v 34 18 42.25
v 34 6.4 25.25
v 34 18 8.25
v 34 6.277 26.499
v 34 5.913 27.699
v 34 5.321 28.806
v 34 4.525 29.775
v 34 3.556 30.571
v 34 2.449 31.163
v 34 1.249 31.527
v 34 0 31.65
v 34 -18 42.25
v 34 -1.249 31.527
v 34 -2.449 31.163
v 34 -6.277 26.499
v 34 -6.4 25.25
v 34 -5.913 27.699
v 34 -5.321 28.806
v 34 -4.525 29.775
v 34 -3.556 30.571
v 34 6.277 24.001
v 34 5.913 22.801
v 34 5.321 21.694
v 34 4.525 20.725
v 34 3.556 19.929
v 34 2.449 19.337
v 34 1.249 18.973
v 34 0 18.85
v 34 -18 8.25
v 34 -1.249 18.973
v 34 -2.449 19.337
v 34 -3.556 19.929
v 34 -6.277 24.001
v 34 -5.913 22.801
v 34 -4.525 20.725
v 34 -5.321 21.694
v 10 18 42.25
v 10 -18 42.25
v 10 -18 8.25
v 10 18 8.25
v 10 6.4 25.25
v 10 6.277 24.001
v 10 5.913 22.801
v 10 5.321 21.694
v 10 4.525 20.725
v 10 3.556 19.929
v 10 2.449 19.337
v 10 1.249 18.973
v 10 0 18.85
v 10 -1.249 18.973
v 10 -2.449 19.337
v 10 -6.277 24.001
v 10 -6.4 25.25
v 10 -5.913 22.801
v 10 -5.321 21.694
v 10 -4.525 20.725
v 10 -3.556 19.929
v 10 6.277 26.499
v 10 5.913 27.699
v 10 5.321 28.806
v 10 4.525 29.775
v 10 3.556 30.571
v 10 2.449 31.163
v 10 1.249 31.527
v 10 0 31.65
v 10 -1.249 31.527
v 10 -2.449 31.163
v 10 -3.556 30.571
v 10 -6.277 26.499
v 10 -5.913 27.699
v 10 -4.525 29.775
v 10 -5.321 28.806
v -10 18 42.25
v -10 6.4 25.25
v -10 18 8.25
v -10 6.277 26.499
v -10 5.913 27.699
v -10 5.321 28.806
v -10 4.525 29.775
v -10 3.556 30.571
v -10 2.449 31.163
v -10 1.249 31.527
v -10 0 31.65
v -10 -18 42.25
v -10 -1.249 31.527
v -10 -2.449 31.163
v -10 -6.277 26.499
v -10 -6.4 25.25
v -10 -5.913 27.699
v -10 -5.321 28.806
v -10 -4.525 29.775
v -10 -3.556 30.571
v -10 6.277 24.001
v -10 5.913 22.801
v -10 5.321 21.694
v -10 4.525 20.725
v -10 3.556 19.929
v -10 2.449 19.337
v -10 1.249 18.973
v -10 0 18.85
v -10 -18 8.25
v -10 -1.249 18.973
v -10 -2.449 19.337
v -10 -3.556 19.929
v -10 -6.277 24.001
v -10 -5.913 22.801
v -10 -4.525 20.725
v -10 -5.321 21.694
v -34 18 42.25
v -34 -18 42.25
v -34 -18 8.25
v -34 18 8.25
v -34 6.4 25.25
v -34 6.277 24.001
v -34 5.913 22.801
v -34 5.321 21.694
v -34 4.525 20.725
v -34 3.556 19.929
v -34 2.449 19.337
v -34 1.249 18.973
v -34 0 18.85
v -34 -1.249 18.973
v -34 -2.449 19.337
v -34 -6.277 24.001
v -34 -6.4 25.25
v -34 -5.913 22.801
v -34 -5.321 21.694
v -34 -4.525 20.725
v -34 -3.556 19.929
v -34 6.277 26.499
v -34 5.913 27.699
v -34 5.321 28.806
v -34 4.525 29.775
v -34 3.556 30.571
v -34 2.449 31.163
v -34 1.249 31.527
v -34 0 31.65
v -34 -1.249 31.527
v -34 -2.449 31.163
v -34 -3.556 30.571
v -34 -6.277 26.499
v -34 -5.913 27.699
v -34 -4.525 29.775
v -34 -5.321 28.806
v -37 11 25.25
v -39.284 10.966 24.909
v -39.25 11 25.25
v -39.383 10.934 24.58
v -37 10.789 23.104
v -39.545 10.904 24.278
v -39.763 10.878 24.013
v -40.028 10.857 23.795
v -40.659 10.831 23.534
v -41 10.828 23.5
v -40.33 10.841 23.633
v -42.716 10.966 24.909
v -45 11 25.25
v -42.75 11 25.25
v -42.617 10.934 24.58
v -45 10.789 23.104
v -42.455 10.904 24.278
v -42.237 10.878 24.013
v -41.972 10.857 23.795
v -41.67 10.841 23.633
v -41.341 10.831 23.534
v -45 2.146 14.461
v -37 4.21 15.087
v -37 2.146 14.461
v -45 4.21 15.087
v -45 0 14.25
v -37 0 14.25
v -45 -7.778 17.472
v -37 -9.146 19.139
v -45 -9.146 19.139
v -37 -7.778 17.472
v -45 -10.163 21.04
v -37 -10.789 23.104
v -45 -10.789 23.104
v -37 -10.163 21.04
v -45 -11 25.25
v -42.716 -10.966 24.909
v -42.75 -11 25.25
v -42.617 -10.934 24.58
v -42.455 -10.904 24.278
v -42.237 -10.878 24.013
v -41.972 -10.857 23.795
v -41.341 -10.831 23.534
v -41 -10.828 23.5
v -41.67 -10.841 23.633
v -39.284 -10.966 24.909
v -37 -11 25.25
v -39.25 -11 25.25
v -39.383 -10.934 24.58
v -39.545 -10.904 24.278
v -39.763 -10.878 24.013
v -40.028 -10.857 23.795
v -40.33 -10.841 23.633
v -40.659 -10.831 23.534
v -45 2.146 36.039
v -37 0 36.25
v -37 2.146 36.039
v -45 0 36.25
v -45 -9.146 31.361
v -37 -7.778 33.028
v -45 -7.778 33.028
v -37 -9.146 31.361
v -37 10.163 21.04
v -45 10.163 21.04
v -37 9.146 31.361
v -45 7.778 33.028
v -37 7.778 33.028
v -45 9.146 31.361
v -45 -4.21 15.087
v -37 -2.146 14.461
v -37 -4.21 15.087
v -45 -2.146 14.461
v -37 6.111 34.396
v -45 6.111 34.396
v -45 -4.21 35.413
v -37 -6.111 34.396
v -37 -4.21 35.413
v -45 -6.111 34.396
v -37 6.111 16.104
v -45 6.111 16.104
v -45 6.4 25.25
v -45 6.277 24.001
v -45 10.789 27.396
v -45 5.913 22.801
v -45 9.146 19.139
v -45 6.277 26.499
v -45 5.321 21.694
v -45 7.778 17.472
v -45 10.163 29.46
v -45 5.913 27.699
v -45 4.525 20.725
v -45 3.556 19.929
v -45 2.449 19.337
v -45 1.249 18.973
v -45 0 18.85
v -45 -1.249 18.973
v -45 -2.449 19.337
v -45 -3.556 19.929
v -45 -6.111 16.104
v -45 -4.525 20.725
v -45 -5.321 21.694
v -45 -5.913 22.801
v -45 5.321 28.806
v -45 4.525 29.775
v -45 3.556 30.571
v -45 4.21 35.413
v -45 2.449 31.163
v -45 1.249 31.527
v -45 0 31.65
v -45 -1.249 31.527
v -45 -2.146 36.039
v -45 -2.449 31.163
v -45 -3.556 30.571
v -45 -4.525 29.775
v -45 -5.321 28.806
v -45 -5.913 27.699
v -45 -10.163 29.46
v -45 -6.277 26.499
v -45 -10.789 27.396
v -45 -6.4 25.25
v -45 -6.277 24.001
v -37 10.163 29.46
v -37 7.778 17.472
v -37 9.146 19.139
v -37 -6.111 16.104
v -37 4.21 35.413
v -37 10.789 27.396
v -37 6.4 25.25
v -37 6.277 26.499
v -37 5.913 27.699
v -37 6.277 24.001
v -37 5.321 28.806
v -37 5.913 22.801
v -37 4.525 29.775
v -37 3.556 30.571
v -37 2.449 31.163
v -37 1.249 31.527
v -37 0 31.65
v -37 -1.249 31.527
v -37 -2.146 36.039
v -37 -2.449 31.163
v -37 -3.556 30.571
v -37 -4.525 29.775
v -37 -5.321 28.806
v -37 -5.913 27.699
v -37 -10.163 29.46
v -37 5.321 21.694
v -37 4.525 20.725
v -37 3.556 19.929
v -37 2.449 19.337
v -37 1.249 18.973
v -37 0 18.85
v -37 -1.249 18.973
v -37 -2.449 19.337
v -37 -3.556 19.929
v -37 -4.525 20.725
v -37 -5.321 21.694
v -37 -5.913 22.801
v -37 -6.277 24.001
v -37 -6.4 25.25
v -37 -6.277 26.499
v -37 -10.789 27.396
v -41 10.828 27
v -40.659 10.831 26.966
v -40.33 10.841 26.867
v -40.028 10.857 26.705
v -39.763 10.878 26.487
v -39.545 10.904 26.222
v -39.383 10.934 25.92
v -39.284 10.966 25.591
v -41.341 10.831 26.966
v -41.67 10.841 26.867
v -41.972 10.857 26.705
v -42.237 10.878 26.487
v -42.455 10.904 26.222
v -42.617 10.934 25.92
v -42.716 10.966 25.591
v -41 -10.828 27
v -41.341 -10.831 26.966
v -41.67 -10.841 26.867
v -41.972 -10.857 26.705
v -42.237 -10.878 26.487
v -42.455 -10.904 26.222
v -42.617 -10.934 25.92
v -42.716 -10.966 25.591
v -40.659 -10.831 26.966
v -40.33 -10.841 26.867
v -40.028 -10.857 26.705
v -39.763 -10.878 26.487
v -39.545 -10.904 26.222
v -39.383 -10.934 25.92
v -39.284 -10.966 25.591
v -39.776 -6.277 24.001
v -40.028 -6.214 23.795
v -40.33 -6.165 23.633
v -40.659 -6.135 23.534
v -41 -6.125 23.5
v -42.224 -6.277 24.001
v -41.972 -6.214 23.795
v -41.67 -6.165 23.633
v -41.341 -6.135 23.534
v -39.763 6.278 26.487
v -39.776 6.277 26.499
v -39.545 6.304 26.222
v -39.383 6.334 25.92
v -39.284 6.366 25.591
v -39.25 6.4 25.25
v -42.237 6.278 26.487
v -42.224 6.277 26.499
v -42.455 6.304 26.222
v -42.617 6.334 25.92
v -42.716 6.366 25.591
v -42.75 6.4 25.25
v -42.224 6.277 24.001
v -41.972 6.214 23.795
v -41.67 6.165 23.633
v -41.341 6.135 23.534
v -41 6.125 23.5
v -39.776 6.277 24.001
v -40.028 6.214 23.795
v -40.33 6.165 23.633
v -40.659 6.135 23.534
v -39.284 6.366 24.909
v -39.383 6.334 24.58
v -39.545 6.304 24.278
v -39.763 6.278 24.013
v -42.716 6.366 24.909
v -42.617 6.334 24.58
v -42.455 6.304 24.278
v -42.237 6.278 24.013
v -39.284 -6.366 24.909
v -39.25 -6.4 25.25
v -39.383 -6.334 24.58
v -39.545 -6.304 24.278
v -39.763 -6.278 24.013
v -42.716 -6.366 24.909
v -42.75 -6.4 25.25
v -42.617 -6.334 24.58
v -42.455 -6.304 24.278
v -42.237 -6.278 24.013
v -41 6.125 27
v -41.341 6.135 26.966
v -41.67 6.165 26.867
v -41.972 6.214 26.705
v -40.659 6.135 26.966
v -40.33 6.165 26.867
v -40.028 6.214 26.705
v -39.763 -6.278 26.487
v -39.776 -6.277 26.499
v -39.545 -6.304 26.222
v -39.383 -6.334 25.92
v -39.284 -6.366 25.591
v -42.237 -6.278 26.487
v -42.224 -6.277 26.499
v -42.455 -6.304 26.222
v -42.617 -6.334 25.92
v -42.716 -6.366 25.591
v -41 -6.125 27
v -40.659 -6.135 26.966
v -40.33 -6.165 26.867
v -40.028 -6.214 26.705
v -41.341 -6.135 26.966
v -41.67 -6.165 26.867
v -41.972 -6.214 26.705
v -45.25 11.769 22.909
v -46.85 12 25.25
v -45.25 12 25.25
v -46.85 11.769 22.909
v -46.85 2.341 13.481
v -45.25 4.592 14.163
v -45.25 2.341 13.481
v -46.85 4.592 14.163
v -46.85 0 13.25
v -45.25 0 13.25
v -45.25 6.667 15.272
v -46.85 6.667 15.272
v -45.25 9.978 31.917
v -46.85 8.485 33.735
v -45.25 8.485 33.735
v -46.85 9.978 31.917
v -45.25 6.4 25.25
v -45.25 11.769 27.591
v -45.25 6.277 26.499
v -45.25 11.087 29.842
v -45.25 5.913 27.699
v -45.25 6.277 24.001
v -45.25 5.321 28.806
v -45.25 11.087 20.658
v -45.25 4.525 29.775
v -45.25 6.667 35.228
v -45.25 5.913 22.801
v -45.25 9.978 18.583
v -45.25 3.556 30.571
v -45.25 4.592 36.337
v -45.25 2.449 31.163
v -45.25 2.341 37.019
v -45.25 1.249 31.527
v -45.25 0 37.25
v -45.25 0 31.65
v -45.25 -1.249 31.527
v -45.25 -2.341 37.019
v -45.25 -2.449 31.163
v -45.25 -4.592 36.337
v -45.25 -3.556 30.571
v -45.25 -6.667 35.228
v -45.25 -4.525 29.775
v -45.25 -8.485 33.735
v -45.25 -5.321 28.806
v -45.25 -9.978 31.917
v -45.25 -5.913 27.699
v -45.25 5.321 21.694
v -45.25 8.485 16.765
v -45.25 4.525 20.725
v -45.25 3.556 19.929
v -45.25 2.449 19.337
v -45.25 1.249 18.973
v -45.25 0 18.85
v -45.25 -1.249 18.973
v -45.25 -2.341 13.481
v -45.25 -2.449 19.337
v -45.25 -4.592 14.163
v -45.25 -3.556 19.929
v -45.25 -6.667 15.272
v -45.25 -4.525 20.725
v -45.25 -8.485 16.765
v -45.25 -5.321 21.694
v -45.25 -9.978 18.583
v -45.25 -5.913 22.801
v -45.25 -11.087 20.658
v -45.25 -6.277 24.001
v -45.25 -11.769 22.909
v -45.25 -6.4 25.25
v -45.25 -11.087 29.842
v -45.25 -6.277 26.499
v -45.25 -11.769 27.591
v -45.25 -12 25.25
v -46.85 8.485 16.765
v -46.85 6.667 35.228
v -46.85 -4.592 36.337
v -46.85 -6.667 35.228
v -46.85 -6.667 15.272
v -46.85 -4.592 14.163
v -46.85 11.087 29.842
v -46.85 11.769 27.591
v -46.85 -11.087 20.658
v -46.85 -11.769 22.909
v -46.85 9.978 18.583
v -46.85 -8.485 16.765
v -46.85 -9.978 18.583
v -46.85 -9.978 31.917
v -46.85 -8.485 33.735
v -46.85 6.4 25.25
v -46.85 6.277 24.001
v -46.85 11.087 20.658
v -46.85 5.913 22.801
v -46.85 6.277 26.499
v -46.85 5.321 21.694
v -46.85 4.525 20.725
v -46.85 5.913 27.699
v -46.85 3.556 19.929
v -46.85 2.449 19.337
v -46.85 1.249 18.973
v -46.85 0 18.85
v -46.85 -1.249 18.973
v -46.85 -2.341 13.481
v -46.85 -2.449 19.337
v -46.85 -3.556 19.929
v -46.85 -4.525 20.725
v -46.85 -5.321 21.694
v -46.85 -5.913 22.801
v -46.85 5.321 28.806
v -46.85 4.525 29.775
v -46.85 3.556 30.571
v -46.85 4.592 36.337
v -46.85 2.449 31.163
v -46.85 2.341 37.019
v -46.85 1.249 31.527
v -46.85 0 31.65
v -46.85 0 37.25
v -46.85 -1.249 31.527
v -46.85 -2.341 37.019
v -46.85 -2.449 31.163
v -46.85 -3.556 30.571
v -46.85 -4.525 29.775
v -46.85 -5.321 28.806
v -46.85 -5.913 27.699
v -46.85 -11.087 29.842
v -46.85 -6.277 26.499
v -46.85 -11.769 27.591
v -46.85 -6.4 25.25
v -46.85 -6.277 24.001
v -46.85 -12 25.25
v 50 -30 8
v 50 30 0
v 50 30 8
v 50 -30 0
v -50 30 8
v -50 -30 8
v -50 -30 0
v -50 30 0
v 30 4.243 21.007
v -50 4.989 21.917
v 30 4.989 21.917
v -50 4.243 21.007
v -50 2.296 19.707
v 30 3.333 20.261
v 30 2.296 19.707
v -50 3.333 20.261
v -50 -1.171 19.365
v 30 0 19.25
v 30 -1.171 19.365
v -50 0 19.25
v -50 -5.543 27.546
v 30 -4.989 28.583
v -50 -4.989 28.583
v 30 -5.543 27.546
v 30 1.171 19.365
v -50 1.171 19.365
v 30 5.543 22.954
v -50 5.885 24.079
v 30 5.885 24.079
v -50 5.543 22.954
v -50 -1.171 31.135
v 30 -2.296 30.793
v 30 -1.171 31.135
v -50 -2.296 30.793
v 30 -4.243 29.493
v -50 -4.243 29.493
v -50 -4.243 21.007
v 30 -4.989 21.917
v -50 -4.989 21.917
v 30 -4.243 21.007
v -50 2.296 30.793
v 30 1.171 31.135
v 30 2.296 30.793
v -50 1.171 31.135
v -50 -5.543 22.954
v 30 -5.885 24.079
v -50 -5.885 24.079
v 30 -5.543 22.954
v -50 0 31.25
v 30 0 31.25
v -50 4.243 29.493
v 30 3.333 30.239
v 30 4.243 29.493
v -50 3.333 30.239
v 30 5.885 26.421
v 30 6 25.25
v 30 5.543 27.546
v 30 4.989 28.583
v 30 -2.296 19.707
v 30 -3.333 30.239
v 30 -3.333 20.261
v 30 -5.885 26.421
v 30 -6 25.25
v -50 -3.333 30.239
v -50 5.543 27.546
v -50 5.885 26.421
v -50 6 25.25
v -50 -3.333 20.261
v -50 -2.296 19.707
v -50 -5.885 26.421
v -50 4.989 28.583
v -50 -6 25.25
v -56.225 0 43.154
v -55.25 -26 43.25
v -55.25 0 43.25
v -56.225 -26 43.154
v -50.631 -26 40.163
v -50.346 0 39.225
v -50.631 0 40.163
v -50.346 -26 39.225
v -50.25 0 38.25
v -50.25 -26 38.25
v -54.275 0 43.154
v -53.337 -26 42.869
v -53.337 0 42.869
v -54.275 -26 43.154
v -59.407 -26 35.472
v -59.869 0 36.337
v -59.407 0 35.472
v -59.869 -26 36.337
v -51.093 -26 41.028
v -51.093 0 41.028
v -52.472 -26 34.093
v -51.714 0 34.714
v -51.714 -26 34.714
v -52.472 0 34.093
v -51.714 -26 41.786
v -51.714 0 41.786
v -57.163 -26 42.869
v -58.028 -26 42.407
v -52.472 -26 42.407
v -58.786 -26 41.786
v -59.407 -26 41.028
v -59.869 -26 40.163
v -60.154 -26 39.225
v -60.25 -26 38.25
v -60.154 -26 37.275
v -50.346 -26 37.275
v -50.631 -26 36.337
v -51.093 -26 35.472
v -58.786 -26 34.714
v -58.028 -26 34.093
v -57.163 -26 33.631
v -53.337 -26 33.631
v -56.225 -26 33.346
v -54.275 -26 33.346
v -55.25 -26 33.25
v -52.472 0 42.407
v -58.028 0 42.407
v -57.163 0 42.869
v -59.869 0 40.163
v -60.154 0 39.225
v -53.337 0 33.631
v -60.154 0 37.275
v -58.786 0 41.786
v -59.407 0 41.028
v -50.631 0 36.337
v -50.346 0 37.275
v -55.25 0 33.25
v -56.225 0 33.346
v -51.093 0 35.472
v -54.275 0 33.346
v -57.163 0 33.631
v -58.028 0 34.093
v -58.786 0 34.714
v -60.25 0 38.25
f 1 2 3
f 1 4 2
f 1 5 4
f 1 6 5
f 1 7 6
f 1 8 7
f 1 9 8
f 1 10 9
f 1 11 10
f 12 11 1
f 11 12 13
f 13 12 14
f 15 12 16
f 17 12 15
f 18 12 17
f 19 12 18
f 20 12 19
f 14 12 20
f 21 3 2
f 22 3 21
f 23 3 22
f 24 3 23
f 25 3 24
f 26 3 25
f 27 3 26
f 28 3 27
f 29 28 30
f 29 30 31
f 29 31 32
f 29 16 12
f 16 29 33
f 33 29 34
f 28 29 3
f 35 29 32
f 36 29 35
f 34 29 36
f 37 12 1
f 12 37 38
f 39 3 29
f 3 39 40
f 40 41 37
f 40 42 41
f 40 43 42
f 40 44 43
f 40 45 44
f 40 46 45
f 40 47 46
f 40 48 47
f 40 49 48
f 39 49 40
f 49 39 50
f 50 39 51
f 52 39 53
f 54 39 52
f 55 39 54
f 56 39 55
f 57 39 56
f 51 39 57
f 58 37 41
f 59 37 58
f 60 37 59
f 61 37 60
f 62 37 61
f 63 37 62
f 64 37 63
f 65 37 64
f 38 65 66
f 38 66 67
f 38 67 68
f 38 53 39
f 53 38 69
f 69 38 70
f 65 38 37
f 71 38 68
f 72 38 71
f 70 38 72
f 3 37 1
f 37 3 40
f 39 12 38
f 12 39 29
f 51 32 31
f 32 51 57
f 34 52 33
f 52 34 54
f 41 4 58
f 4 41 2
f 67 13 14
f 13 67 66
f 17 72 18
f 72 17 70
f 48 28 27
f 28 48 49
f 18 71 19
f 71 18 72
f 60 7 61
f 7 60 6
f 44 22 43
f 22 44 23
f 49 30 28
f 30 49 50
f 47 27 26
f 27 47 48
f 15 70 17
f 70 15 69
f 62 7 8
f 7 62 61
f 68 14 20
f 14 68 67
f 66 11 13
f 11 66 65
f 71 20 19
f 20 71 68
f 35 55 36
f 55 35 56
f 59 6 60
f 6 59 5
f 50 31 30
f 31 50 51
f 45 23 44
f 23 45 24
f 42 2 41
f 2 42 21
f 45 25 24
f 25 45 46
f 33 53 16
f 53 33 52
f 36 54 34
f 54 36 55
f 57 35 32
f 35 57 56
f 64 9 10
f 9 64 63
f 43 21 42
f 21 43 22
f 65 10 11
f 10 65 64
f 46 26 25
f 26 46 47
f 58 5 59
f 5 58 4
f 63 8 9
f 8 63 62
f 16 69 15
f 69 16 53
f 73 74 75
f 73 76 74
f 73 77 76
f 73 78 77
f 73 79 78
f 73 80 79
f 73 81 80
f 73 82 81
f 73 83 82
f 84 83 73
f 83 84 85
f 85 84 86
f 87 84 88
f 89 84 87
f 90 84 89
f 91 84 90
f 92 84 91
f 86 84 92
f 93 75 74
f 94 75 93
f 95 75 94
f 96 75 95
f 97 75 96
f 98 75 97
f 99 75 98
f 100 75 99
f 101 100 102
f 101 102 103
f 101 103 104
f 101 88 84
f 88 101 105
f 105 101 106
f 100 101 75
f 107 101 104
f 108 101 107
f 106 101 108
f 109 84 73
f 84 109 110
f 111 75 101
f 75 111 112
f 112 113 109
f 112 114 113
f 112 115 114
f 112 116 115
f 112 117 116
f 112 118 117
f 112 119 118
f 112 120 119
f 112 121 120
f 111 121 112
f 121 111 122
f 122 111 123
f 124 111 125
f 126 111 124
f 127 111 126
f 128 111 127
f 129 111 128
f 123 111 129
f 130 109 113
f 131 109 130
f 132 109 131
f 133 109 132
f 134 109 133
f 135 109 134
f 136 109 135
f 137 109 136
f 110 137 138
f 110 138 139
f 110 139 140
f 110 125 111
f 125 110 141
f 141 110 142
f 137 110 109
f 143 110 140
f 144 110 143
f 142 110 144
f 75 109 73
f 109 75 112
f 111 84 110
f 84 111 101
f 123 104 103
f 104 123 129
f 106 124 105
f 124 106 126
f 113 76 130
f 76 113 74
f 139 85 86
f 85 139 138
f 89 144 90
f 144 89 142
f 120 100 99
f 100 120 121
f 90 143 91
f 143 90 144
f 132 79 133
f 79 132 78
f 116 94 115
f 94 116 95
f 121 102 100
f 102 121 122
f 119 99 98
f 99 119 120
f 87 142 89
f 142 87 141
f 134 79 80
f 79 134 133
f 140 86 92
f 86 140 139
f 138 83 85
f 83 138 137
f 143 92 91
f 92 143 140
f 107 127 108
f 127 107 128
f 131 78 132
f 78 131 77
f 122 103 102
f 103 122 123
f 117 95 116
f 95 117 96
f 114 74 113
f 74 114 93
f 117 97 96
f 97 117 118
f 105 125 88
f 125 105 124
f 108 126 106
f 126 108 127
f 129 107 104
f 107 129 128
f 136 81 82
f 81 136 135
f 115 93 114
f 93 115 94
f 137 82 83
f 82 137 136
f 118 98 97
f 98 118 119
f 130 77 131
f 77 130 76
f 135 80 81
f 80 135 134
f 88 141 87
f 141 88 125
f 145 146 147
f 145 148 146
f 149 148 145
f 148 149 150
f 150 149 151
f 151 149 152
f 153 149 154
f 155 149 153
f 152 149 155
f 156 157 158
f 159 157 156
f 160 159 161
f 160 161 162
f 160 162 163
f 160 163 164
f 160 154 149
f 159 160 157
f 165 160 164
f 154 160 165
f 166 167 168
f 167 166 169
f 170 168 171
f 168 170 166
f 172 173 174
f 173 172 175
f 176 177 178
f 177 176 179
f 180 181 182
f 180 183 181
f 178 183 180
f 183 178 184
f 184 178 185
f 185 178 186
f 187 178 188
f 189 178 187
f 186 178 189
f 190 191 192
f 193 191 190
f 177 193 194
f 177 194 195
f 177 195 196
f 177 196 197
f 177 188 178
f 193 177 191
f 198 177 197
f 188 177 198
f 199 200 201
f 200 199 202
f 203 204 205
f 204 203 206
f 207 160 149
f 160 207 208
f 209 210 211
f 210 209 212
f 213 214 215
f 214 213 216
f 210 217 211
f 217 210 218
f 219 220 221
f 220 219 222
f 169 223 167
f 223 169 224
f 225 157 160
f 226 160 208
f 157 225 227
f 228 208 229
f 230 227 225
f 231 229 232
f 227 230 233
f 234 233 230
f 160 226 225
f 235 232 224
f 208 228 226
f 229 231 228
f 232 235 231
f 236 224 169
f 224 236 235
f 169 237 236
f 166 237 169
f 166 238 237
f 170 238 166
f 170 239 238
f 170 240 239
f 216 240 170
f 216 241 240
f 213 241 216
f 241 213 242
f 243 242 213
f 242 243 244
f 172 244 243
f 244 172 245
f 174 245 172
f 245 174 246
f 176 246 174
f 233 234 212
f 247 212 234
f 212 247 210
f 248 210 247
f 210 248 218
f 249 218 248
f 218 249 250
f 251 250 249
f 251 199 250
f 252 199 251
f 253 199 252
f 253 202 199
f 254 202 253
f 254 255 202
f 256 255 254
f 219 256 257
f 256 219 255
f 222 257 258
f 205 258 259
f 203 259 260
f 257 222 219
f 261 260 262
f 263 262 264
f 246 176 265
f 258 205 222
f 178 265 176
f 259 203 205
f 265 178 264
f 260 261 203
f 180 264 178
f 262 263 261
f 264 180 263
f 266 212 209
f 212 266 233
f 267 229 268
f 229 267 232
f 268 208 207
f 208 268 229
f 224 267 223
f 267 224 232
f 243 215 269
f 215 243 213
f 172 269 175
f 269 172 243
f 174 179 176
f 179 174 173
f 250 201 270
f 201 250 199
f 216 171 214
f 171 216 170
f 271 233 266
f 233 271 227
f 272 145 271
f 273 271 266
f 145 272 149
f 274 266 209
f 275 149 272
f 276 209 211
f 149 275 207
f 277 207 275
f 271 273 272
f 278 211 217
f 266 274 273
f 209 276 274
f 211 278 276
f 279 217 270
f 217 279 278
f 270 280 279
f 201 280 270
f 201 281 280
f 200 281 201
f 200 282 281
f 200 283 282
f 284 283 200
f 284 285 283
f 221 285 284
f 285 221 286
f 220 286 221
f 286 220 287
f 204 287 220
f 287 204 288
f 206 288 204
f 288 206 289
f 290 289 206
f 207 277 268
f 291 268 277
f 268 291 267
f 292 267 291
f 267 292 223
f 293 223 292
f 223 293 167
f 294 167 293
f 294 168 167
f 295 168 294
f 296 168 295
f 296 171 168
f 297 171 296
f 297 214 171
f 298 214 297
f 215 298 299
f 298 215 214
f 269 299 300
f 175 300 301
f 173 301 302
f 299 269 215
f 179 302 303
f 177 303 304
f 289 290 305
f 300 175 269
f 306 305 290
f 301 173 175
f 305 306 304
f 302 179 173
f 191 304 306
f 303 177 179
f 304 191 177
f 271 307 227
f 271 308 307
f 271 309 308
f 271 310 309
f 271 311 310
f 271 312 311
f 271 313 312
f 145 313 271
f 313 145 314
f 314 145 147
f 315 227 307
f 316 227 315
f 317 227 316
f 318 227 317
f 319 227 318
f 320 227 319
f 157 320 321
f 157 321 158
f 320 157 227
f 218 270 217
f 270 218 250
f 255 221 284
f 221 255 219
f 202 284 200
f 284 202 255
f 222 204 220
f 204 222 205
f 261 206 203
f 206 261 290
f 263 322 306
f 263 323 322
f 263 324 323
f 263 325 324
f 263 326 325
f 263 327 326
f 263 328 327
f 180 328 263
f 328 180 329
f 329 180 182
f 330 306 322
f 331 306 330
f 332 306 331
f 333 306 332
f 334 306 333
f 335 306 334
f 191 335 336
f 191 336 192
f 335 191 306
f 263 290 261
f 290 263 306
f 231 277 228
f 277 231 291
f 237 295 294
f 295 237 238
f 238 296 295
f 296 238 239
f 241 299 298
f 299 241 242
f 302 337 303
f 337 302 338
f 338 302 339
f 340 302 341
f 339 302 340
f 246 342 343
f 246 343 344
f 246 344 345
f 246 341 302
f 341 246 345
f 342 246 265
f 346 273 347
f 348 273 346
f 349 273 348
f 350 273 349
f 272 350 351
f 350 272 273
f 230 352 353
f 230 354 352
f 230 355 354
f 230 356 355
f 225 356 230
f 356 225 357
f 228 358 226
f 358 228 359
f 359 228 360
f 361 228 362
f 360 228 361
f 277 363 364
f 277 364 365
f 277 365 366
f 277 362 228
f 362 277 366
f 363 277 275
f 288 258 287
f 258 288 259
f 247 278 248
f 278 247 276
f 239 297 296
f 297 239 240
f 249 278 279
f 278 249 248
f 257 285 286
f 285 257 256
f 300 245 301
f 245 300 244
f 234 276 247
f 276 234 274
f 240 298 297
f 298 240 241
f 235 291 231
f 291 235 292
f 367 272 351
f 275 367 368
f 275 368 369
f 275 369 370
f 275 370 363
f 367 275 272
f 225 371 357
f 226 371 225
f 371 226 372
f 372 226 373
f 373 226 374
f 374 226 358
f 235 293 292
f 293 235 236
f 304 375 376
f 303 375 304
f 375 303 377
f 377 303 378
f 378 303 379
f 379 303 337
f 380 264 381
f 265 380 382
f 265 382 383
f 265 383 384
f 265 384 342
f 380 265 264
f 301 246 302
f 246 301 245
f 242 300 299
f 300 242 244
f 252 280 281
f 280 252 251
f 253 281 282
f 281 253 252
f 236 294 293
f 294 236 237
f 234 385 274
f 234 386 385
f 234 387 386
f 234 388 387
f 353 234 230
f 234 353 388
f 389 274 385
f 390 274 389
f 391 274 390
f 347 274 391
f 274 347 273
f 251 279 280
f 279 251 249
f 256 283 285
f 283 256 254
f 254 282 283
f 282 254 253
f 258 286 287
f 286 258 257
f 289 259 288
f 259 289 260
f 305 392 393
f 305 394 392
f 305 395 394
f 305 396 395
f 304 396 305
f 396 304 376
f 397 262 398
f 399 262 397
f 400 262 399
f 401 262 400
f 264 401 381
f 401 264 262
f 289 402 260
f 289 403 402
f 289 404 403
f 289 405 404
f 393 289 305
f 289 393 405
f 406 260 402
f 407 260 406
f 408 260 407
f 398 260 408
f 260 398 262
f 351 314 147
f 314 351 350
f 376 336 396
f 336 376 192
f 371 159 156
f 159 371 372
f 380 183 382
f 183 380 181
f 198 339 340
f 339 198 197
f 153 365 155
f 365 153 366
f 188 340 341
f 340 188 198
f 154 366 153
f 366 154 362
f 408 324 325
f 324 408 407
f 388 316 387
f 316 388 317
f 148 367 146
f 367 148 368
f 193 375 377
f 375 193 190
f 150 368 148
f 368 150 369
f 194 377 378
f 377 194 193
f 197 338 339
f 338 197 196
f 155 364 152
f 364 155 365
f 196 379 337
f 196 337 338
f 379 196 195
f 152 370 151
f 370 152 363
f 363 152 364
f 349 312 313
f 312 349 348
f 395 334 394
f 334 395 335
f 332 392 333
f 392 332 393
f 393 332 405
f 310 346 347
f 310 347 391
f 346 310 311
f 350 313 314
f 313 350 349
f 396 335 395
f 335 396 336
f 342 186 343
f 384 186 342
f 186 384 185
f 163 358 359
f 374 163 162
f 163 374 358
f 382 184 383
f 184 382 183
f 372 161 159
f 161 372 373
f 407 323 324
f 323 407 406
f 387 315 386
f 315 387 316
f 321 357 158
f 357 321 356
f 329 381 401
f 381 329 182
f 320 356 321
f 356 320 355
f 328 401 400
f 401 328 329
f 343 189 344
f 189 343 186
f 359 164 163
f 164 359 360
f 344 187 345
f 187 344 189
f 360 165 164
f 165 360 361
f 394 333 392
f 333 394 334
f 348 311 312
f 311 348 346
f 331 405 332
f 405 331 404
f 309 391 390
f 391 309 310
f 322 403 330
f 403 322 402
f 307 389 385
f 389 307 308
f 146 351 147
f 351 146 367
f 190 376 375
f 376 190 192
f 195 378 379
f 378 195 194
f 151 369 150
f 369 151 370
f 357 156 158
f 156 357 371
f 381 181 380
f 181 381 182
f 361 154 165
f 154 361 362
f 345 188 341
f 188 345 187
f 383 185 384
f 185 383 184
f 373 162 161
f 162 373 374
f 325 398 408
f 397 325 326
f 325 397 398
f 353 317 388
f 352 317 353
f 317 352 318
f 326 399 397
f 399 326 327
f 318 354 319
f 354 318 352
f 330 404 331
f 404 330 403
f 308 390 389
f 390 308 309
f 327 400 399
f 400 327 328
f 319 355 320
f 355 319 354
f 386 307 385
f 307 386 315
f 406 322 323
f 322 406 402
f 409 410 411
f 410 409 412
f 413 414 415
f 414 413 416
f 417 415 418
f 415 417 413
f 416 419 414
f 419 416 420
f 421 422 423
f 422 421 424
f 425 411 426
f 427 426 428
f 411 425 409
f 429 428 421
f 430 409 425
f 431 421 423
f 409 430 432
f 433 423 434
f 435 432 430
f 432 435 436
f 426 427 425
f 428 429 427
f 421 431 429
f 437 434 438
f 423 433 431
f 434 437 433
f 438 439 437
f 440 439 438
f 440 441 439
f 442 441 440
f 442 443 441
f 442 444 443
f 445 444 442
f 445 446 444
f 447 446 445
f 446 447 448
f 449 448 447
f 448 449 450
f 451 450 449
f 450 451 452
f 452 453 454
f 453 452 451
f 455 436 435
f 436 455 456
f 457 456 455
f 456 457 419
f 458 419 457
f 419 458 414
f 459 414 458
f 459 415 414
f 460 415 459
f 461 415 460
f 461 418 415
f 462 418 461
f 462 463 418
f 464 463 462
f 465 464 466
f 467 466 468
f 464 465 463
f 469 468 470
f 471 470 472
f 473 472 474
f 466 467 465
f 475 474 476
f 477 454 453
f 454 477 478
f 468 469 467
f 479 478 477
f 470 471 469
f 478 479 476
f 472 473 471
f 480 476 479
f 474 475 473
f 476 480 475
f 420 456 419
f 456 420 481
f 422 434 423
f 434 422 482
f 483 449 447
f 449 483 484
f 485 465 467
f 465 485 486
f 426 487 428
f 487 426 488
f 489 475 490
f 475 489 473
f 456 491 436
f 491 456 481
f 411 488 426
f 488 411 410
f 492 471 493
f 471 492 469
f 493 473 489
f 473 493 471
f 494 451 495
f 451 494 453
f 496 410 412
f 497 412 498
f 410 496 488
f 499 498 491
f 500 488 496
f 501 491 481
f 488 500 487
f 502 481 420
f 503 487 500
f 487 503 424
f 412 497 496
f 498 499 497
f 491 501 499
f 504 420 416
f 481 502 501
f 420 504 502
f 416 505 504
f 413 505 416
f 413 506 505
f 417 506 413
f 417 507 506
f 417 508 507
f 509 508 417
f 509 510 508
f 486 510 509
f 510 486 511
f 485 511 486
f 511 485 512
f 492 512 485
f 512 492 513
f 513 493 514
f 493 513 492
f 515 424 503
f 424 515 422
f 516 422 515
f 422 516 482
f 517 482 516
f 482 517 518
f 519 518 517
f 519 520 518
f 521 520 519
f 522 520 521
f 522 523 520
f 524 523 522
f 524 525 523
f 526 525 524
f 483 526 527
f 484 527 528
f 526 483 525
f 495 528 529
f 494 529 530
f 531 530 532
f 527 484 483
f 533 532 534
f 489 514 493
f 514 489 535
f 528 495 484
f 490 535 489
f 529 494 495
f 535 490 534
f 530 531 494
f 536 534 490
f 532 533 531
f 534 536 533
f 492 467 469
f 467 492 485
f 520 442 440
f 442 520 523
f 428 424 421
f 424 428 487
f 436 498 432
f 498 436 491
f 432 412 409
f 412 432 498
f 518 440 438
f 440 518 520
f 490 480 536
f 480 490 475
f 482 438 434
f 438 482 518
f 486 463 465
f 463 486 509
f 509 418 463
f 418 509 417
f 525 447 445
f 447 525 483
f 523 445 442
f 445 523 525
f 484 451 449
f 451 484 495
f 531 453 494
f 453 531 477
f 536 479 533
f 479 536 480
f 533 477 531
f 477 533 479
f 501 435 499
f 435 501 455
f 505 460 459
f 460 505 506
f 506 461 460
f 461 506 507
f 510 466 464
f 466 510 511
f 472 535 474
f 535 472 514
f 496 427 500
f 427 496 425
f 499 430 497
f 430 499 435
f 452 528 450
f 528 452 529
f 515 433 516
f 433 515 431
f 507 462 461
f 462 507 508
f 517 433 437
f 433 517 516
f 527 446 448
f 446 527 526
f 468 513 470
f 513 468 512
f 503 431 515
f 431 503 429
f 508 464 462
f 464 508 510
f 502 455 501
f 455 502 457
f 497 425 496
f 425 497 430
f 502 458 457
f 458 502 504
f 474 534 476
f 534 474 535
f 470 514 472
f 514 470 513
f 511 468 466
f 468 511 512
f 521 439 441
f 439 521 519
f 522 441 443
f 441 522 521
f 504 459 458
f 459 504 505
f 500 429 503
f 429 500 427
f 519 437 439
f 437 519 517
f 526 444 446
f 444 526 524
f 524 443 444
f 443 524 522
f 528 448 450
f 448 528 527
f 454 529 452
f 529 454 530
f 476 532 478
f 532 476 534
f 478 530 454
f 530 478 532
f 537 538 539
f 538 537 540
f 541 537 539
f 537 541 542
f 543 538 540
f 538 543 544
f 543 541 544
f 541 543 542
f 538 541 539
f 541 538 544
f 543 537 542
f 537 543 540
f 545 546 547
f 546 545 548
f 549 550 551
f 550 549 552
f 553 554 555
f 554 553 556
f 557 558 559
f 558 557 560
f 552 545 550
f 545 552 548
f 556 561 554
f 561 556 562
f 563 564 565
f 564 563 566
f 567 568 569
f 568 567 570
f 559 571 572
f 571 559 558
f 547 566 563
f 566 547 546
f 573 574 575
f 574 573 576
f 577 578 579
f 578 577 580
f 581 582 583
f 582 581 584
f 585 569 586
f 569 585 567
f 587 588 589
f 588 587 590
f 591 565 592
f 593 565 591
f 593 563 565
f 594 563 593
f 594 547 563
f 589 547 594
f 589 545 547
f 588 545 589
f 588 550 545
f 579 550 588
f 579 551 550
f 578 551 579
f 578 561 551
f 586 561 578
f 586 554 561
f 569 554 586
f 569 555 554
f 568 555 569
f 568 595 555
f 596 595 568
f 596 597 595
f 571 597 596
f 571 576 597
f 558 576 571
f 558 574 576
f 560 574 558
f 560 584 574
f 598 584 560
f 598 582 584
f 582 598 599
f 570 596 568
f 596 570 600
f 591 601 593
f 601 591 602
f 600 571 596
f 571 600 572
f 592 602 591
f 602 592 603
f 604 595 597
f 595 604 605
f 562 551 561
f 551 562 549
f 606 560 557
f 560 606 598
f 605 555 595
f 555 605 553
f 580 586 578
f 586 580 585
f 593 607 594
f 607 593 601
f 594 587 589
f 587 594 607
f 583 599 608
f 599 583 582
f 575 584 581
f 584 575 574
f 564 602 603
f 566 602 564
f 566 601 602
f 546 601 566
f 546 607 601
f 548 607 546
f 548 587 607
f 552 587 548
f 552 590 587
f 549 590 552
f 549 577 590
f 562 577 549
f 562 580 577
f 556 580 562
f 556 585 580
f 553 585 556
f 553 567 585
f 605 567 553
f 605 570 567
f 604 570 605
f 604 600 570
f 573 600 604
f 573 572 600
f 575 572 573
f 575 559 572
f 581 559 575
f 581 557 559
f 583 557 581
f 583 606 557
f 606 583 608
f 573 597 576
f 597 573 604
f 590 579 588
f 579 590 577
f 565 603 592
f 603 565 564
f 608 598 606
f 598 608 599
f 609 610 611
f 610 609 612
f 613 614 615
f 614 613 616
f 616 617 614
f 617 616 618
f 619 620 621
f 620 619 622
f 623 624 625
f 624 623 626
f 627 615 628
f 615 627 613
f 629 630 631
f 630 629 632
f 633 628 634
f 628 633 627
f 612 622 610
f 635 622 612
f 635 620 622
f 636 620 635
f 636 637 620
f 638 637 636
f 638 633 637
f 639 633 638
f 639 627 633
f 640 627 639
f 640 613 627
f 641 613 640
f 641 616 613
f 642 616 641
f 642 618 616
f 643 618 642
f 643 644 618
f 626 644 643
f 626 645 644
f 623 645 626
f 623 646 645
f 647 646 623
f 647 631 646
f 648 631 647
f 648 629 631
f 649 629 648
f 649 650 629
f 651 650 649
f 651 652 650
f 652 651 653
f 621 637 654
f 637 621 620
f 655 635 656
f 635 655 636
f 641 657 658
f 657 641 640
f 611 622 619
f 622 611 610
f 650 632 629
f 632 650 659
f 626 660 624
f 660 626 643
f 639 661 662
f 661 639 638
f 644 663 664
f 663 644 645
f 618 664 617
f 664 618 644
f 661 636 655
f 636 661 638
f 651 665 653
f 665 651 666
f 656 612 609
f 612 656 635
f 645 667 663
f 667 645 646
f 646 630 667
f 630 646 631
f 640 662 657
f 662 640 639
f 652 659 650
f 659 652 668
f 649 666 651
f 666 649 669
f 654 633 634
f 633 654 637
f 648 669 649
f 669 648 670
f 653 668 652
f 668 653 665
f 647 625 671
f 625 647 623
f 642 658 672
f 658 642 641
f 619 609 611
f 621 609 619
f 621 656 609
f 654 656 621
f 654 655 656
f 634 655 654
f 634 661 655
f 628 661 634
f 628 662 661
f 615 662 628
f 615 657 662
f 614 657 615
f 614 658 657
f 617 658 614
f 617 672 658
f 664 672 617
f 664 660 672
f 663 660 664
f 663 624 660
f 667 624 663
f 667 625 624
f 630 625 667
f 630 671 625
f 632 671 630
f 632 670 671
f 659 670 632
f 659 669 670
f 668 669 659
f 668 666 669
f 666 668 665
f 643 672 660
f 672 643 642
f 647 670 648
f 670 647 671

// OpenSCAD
$fn = 32;

// ------------------------------------------------------------------------
// Machine vise: screw d12, jaws 24 x 34 mm
// Every part is its own module, assembly() places every instance.
// ------------------------------------------------------------------------

// --- part 1 ---
module vise_bed() {
  difference() {
    translate([-50, -30, 0]) cube([100, 60, 8]);
  }
}

// --- part 2 ---
module vise_jaw() {
  difference() {
    translate([-12, -18, 0]) cube([24, 36, 34]);
    translate([0, 0, 17]) rotate([0, 90, 0]) cylinder(h = 26, d = 12.8, center = true);
  }
}

// --- part 3 ---
module vise_screw() {
  translate([0, 0, -40]) cylinder(h = 80, d = 12);
}

// --- part 4 ---
module screw_collar() {
  difference() {
    cylinder(h = 8, d = 22);
    translate([0, 0, -1]) cylinder(h = 10, d = 12.8);
    translate([0, 0, 4]) rotate([90, 0, 0]) cylinder(h = 24, d = 3.5, center = true);
  }
}

// --- part 5 ---
module screw_washer() {
  difference() {
      translate([0, 0, 0]) cylinder(h = 1.6, d = 24);
      translate([0, 0, -1]) cylinder(h = 3.6, d = 12.8);
    }
}

// --- part 6 ---
module vise_handle() {
  cylinder(h = 26, d = 10);
}

// --- assembly ---
module assembly() {
  color([0.80, 0.24, 0.20]) translate([0, 0, 0]) rotate([0, 0, 0]) vise_bed();
  color([0.20, 0.45, 0.75]) translate([22, 0, 8.25]) rotate([0, 0, 0]) vise_jaw();
  color([0.25, 0.62, 0.32]) translate([-22, 0, 8.25]) rotate([0, 0, 0]) vise_jaw();
  color([0.92, 0.70, 0.18]) translate([-10, 0, 25.25]) rotate([0, 90, 0]) vise_screw();
  color([0.58, 0.35, 0.70]) translate([-45, 0, 25.25]) rotate([0, 90, 0]) screw_collar();
  color([0.16, 0.66, 0.66]) translate([-46.85, 0, 25.25]) rotate([0, 90, 0]) screw_washer();
  color([0.85, 0.48, 0.18]) translate([-55.25, 0, 38.25]) rotate([90, 0, 0]) vise_handle();
}

assembly();
